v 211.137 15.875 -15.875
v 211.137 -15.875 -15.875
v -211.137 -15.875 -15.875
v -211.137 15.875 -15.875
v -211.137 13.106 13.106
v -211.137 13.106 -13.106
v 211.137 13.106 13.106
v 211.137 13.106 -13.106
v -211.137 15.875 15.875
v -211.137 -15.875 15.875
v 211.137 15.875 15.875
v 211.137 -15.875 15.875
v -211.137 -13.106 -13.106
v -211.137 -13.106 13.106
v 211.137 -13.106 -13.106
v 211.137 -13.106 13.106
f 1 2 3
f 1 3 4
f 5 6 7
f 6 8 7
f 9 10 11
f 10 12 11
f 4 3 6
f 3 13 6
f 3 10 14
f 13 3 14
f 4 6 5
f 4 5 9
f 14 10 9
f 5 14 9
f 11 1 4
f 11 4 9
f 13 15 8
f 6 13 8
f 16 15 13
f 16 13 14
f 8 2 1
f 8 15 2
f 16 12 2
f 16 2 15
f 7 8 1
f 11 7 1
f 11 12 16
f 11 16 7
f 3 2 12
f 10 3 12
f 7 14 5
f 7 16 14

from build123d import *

# Parameters (mm, degrees)
SKETCH_W       = 31.75
SKETCH_H       = 31.75
SKETCH_W_2     = 26.2128
SKETCH_H_2     = 26.2128
PAD_DEPTH      = 211.137
PAD_DEPTH_BACK = 211.137


with BuildPart() as part:
    # Sketch → Pad (new body, two sides)
    with BuildSketch(Plane.YZ) as pad_sk:
        Rectangle(SKETCH_W, SKETCH_H)
        Rectangle(SKETCH_W_2, SKETCH_H_2, mode=Mode.SUBTRACT)
    extrude(amount=PAD_DEPTH)
    extrude(pad_sk.sketch, amount=-PAD_DEPTH_BACK)


solid = part.part
